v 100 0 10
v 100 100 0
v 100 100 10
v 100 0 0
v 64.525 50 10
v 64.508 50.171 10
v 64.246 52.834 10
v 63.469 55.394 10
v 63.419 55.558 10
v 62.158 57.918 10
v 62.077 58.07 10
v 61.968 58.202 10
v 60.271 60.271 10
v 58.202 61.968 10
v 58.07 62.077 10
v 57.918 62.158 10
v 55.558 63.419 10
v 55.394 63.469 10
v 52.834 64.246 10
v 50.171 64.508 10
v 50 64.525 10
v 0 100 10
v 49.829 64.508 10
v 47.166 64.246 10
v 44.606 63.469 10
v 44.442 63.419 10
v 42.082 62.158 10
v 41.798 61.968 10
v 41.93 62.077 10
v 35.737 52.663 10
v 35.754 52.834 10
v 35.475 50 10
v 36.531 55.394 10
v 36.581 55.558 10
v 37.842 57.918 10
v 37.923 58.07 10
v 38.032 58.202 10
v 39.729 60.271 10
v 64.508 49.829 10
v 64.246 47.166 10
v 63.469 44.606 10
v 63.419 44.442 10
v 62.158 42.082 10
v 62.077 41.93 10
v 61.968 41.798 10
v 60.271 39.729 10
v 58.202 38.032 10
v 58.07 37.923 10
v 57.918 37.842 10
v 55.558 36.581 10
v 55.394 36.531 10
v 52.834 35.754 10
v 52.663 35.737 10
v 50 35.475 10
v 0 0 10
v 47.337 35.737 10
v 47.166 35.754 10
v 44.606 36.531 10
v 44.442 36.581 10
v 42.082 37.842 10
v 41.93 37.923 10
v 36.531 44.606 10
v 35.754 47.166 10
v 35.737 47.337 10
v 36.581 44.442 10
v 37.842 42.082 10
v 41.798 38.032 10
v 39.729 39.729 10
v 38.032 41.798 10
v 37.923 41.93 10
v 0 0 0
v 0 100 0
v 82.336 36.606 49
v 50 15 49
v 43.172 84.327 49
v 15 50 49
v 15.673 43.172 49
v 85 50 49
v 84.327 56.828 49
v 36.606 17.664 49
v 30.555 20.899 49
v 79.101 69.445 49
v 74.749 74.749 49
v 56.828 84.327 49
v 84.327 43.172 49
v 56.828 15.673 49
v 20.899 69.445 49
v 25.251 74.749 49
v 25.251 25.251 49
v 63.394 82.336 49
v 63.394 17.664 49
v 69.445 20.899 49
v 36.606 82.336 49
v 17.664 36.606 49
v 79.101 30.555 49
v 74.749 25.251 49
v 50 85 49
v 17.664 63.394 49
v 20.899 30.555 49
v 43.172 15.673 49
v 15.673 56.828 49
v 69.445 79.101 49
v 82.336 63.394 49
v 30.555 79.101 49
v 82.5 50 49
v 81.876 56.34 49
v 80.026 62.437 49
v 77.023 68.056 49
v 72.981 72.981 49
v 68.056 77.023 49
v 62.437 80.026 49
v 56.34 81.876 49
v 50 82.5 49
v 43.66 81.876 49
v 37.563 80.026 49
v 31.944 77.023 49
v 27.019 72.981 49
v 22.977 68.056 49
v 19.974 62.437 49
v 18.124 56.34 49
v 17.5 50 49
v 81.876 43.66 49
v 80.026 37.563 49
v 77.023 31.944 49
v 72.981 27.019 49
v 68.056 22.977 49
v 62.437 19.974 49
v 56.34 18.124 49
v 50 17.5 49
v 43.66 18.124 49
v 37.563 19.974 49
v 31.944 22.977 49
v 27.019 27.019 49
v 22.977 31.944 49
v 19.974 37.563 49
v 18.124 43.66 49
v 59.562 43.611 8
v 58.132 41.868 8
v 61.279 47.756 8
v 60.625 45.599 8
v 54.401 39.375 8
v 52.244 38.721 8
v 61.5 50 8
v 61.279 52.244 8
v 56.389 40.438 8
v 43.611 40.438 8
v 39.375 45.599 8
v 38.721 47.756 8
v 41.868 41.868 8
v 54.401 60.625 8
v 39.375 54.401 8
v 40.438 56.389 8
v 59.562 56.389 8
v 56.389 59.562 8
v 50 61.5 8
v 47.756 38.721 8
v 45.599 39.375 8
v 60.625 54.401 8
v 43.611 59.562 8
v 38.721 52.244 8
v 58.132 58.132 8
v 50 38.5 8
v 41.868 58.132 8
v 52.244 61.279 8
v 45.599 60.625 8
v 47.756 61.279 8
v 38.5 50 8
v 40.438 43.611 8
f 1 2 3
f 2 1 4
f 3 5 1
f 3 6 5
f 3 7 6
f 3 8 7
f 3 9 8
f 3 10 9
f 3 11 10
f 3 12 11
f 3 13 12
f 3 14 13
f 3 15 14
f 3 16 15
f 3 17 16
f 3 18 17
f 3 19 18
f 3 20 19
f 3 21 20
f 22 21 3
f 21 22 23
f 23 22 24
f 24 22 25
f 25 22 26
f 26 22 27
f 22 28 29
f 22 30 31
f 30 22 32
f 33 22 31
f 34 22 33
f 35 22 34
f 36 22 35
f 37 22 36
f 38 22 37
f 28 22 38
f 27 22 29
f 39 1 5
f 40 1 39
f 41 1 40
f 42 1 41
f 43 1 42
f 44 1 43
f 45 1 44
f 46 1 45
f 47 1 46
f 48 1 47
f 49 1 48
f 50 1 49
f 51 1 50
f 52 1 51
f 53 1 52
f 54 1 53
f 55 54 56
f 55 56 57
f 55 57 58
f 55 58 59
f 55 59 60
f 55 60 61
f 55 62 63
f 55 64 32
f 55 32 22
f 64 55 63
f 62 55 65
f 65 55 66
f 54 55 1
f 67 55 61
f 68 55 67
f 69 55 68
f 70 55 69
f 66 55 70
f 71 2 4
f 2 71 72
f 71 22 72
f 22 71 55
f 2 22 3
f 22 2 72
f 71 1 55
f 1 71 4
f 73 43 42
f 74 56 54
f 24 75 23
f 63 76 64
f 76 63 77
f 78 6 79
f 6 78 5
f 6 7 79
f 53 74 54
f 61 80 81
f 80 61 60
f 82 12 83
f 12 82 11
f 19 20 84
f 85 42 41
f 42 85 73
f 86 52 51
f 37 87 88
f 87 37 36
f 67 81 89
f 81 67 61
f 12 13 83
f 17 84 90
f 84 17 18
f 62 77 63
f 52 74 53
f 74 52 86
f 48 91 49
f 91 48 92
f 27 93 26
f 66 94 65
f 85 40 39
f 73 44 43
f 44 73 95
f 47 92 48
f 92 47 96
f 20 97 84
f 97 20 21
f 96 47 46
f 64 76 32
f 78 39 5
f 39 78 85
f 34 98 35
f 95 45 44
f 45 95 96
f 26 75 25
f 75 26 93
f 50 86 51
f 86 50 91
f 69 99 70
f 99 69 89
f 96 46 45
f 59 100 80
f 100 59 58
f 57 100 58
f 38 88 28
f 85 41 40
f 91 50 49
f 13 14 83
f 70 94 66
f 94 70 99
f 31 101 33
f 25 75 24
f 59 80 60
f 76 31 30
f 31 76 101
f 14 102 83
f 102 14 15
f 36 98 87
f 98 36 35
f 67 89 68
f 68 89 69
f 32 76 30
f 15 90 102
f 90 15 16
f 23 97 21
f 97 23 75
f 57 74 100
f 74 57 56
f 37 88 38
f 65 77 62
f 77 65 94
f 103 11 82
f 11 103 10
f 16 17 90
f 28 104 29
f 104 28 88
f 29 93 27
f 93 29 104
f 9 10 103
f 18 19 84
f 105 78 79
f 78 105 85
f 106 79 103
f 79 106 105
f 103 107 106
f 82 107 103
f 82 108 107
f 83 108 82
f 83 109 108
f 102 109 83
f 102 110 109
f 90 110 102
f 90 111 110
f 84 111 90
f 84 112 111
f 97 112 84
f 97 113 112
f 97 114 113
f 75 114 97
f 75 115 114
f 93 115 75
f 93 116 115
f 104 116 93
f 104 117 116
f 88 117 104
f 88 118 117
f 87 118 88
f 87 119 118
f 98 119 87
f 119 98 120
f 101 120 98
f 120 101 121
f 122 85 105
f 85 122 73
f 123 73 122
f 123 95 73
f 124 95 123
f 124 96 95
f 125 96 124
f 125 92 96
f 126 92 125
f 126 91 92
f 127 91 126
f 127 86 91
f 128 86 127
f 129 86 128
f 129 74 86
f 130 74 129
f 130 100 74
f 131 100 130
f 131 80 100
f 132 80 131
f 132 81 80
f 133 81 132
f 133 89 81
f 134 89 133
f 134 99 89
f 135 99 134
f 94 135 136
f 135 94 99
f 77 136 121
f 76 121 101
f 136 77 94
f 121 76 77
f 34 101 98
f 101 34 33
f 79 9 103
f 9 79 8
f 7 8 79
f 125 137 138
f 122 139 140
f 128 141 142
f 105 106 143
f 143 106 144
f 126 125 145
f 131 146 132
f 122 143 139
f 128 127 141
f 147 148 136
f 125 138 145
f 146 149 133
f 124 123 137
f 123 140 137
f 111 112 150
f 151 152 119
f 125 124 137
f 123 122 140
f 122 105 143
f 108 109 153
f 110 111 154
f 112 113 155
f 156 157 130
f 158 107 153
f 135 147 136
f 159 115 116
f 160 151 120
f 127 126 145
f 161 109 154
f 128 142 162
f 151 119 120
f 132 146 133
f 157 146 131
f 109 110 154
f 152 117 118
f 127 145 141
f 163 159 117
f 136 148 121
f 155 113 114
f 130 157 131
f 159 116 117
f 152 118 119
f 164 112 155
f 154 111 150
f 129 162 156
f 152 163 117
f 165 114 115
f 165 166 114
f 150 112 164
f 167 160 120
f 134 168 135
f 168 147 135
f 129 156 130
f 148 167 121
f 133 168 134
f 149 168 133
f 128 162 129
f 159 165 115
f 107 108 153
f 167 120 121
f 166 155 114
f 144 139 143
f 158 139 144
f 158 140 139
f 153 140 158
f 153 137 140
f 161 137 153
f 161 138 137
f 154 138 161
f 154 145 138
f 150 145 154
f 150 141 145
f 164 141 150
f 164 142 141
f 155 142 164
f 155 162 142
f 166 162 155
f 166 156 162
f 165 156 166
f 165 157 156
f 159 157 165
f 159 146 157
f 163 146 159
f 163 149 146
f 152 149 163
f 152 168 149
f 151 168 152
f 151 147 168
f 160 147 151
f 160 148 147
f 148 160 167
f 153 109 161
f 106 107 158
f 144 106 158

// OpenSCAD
$fn = 32;

// ----------------------------------------------------------------------
// Hopper: funnel with square flange
// ----------------------------------------------------------------------

// --- parameters (mm) ---
fl = 100;                 // flange side, X and Y
fl_t = 10;                // flange thickness
cone_h = 40;              // cone height above the flange
top_d = 70;               // cone mouth diameter
bot_d = 28;               // cone spout diameter
wall = 2.5;               // cone wall thickness

bore_d = bot_d - 2 * wall;  // spout bore diameter
total_h = fl_t + cone_h - 1;  // overall height

difference() {
  union() {
    cube([fl, fl, fl_t]);
    translate([fl / 2, fl / 2, fl_t - 1])
      cylinder(h = cone_h, d1 = bot_d, d2 = top_d);
  }
  translate([fl / 2, fl / 2, fl_t - 2])
    cylinder(h = cone_h + 1, d1 = bore_d, d2 = top_d - 2 * wall);
}
